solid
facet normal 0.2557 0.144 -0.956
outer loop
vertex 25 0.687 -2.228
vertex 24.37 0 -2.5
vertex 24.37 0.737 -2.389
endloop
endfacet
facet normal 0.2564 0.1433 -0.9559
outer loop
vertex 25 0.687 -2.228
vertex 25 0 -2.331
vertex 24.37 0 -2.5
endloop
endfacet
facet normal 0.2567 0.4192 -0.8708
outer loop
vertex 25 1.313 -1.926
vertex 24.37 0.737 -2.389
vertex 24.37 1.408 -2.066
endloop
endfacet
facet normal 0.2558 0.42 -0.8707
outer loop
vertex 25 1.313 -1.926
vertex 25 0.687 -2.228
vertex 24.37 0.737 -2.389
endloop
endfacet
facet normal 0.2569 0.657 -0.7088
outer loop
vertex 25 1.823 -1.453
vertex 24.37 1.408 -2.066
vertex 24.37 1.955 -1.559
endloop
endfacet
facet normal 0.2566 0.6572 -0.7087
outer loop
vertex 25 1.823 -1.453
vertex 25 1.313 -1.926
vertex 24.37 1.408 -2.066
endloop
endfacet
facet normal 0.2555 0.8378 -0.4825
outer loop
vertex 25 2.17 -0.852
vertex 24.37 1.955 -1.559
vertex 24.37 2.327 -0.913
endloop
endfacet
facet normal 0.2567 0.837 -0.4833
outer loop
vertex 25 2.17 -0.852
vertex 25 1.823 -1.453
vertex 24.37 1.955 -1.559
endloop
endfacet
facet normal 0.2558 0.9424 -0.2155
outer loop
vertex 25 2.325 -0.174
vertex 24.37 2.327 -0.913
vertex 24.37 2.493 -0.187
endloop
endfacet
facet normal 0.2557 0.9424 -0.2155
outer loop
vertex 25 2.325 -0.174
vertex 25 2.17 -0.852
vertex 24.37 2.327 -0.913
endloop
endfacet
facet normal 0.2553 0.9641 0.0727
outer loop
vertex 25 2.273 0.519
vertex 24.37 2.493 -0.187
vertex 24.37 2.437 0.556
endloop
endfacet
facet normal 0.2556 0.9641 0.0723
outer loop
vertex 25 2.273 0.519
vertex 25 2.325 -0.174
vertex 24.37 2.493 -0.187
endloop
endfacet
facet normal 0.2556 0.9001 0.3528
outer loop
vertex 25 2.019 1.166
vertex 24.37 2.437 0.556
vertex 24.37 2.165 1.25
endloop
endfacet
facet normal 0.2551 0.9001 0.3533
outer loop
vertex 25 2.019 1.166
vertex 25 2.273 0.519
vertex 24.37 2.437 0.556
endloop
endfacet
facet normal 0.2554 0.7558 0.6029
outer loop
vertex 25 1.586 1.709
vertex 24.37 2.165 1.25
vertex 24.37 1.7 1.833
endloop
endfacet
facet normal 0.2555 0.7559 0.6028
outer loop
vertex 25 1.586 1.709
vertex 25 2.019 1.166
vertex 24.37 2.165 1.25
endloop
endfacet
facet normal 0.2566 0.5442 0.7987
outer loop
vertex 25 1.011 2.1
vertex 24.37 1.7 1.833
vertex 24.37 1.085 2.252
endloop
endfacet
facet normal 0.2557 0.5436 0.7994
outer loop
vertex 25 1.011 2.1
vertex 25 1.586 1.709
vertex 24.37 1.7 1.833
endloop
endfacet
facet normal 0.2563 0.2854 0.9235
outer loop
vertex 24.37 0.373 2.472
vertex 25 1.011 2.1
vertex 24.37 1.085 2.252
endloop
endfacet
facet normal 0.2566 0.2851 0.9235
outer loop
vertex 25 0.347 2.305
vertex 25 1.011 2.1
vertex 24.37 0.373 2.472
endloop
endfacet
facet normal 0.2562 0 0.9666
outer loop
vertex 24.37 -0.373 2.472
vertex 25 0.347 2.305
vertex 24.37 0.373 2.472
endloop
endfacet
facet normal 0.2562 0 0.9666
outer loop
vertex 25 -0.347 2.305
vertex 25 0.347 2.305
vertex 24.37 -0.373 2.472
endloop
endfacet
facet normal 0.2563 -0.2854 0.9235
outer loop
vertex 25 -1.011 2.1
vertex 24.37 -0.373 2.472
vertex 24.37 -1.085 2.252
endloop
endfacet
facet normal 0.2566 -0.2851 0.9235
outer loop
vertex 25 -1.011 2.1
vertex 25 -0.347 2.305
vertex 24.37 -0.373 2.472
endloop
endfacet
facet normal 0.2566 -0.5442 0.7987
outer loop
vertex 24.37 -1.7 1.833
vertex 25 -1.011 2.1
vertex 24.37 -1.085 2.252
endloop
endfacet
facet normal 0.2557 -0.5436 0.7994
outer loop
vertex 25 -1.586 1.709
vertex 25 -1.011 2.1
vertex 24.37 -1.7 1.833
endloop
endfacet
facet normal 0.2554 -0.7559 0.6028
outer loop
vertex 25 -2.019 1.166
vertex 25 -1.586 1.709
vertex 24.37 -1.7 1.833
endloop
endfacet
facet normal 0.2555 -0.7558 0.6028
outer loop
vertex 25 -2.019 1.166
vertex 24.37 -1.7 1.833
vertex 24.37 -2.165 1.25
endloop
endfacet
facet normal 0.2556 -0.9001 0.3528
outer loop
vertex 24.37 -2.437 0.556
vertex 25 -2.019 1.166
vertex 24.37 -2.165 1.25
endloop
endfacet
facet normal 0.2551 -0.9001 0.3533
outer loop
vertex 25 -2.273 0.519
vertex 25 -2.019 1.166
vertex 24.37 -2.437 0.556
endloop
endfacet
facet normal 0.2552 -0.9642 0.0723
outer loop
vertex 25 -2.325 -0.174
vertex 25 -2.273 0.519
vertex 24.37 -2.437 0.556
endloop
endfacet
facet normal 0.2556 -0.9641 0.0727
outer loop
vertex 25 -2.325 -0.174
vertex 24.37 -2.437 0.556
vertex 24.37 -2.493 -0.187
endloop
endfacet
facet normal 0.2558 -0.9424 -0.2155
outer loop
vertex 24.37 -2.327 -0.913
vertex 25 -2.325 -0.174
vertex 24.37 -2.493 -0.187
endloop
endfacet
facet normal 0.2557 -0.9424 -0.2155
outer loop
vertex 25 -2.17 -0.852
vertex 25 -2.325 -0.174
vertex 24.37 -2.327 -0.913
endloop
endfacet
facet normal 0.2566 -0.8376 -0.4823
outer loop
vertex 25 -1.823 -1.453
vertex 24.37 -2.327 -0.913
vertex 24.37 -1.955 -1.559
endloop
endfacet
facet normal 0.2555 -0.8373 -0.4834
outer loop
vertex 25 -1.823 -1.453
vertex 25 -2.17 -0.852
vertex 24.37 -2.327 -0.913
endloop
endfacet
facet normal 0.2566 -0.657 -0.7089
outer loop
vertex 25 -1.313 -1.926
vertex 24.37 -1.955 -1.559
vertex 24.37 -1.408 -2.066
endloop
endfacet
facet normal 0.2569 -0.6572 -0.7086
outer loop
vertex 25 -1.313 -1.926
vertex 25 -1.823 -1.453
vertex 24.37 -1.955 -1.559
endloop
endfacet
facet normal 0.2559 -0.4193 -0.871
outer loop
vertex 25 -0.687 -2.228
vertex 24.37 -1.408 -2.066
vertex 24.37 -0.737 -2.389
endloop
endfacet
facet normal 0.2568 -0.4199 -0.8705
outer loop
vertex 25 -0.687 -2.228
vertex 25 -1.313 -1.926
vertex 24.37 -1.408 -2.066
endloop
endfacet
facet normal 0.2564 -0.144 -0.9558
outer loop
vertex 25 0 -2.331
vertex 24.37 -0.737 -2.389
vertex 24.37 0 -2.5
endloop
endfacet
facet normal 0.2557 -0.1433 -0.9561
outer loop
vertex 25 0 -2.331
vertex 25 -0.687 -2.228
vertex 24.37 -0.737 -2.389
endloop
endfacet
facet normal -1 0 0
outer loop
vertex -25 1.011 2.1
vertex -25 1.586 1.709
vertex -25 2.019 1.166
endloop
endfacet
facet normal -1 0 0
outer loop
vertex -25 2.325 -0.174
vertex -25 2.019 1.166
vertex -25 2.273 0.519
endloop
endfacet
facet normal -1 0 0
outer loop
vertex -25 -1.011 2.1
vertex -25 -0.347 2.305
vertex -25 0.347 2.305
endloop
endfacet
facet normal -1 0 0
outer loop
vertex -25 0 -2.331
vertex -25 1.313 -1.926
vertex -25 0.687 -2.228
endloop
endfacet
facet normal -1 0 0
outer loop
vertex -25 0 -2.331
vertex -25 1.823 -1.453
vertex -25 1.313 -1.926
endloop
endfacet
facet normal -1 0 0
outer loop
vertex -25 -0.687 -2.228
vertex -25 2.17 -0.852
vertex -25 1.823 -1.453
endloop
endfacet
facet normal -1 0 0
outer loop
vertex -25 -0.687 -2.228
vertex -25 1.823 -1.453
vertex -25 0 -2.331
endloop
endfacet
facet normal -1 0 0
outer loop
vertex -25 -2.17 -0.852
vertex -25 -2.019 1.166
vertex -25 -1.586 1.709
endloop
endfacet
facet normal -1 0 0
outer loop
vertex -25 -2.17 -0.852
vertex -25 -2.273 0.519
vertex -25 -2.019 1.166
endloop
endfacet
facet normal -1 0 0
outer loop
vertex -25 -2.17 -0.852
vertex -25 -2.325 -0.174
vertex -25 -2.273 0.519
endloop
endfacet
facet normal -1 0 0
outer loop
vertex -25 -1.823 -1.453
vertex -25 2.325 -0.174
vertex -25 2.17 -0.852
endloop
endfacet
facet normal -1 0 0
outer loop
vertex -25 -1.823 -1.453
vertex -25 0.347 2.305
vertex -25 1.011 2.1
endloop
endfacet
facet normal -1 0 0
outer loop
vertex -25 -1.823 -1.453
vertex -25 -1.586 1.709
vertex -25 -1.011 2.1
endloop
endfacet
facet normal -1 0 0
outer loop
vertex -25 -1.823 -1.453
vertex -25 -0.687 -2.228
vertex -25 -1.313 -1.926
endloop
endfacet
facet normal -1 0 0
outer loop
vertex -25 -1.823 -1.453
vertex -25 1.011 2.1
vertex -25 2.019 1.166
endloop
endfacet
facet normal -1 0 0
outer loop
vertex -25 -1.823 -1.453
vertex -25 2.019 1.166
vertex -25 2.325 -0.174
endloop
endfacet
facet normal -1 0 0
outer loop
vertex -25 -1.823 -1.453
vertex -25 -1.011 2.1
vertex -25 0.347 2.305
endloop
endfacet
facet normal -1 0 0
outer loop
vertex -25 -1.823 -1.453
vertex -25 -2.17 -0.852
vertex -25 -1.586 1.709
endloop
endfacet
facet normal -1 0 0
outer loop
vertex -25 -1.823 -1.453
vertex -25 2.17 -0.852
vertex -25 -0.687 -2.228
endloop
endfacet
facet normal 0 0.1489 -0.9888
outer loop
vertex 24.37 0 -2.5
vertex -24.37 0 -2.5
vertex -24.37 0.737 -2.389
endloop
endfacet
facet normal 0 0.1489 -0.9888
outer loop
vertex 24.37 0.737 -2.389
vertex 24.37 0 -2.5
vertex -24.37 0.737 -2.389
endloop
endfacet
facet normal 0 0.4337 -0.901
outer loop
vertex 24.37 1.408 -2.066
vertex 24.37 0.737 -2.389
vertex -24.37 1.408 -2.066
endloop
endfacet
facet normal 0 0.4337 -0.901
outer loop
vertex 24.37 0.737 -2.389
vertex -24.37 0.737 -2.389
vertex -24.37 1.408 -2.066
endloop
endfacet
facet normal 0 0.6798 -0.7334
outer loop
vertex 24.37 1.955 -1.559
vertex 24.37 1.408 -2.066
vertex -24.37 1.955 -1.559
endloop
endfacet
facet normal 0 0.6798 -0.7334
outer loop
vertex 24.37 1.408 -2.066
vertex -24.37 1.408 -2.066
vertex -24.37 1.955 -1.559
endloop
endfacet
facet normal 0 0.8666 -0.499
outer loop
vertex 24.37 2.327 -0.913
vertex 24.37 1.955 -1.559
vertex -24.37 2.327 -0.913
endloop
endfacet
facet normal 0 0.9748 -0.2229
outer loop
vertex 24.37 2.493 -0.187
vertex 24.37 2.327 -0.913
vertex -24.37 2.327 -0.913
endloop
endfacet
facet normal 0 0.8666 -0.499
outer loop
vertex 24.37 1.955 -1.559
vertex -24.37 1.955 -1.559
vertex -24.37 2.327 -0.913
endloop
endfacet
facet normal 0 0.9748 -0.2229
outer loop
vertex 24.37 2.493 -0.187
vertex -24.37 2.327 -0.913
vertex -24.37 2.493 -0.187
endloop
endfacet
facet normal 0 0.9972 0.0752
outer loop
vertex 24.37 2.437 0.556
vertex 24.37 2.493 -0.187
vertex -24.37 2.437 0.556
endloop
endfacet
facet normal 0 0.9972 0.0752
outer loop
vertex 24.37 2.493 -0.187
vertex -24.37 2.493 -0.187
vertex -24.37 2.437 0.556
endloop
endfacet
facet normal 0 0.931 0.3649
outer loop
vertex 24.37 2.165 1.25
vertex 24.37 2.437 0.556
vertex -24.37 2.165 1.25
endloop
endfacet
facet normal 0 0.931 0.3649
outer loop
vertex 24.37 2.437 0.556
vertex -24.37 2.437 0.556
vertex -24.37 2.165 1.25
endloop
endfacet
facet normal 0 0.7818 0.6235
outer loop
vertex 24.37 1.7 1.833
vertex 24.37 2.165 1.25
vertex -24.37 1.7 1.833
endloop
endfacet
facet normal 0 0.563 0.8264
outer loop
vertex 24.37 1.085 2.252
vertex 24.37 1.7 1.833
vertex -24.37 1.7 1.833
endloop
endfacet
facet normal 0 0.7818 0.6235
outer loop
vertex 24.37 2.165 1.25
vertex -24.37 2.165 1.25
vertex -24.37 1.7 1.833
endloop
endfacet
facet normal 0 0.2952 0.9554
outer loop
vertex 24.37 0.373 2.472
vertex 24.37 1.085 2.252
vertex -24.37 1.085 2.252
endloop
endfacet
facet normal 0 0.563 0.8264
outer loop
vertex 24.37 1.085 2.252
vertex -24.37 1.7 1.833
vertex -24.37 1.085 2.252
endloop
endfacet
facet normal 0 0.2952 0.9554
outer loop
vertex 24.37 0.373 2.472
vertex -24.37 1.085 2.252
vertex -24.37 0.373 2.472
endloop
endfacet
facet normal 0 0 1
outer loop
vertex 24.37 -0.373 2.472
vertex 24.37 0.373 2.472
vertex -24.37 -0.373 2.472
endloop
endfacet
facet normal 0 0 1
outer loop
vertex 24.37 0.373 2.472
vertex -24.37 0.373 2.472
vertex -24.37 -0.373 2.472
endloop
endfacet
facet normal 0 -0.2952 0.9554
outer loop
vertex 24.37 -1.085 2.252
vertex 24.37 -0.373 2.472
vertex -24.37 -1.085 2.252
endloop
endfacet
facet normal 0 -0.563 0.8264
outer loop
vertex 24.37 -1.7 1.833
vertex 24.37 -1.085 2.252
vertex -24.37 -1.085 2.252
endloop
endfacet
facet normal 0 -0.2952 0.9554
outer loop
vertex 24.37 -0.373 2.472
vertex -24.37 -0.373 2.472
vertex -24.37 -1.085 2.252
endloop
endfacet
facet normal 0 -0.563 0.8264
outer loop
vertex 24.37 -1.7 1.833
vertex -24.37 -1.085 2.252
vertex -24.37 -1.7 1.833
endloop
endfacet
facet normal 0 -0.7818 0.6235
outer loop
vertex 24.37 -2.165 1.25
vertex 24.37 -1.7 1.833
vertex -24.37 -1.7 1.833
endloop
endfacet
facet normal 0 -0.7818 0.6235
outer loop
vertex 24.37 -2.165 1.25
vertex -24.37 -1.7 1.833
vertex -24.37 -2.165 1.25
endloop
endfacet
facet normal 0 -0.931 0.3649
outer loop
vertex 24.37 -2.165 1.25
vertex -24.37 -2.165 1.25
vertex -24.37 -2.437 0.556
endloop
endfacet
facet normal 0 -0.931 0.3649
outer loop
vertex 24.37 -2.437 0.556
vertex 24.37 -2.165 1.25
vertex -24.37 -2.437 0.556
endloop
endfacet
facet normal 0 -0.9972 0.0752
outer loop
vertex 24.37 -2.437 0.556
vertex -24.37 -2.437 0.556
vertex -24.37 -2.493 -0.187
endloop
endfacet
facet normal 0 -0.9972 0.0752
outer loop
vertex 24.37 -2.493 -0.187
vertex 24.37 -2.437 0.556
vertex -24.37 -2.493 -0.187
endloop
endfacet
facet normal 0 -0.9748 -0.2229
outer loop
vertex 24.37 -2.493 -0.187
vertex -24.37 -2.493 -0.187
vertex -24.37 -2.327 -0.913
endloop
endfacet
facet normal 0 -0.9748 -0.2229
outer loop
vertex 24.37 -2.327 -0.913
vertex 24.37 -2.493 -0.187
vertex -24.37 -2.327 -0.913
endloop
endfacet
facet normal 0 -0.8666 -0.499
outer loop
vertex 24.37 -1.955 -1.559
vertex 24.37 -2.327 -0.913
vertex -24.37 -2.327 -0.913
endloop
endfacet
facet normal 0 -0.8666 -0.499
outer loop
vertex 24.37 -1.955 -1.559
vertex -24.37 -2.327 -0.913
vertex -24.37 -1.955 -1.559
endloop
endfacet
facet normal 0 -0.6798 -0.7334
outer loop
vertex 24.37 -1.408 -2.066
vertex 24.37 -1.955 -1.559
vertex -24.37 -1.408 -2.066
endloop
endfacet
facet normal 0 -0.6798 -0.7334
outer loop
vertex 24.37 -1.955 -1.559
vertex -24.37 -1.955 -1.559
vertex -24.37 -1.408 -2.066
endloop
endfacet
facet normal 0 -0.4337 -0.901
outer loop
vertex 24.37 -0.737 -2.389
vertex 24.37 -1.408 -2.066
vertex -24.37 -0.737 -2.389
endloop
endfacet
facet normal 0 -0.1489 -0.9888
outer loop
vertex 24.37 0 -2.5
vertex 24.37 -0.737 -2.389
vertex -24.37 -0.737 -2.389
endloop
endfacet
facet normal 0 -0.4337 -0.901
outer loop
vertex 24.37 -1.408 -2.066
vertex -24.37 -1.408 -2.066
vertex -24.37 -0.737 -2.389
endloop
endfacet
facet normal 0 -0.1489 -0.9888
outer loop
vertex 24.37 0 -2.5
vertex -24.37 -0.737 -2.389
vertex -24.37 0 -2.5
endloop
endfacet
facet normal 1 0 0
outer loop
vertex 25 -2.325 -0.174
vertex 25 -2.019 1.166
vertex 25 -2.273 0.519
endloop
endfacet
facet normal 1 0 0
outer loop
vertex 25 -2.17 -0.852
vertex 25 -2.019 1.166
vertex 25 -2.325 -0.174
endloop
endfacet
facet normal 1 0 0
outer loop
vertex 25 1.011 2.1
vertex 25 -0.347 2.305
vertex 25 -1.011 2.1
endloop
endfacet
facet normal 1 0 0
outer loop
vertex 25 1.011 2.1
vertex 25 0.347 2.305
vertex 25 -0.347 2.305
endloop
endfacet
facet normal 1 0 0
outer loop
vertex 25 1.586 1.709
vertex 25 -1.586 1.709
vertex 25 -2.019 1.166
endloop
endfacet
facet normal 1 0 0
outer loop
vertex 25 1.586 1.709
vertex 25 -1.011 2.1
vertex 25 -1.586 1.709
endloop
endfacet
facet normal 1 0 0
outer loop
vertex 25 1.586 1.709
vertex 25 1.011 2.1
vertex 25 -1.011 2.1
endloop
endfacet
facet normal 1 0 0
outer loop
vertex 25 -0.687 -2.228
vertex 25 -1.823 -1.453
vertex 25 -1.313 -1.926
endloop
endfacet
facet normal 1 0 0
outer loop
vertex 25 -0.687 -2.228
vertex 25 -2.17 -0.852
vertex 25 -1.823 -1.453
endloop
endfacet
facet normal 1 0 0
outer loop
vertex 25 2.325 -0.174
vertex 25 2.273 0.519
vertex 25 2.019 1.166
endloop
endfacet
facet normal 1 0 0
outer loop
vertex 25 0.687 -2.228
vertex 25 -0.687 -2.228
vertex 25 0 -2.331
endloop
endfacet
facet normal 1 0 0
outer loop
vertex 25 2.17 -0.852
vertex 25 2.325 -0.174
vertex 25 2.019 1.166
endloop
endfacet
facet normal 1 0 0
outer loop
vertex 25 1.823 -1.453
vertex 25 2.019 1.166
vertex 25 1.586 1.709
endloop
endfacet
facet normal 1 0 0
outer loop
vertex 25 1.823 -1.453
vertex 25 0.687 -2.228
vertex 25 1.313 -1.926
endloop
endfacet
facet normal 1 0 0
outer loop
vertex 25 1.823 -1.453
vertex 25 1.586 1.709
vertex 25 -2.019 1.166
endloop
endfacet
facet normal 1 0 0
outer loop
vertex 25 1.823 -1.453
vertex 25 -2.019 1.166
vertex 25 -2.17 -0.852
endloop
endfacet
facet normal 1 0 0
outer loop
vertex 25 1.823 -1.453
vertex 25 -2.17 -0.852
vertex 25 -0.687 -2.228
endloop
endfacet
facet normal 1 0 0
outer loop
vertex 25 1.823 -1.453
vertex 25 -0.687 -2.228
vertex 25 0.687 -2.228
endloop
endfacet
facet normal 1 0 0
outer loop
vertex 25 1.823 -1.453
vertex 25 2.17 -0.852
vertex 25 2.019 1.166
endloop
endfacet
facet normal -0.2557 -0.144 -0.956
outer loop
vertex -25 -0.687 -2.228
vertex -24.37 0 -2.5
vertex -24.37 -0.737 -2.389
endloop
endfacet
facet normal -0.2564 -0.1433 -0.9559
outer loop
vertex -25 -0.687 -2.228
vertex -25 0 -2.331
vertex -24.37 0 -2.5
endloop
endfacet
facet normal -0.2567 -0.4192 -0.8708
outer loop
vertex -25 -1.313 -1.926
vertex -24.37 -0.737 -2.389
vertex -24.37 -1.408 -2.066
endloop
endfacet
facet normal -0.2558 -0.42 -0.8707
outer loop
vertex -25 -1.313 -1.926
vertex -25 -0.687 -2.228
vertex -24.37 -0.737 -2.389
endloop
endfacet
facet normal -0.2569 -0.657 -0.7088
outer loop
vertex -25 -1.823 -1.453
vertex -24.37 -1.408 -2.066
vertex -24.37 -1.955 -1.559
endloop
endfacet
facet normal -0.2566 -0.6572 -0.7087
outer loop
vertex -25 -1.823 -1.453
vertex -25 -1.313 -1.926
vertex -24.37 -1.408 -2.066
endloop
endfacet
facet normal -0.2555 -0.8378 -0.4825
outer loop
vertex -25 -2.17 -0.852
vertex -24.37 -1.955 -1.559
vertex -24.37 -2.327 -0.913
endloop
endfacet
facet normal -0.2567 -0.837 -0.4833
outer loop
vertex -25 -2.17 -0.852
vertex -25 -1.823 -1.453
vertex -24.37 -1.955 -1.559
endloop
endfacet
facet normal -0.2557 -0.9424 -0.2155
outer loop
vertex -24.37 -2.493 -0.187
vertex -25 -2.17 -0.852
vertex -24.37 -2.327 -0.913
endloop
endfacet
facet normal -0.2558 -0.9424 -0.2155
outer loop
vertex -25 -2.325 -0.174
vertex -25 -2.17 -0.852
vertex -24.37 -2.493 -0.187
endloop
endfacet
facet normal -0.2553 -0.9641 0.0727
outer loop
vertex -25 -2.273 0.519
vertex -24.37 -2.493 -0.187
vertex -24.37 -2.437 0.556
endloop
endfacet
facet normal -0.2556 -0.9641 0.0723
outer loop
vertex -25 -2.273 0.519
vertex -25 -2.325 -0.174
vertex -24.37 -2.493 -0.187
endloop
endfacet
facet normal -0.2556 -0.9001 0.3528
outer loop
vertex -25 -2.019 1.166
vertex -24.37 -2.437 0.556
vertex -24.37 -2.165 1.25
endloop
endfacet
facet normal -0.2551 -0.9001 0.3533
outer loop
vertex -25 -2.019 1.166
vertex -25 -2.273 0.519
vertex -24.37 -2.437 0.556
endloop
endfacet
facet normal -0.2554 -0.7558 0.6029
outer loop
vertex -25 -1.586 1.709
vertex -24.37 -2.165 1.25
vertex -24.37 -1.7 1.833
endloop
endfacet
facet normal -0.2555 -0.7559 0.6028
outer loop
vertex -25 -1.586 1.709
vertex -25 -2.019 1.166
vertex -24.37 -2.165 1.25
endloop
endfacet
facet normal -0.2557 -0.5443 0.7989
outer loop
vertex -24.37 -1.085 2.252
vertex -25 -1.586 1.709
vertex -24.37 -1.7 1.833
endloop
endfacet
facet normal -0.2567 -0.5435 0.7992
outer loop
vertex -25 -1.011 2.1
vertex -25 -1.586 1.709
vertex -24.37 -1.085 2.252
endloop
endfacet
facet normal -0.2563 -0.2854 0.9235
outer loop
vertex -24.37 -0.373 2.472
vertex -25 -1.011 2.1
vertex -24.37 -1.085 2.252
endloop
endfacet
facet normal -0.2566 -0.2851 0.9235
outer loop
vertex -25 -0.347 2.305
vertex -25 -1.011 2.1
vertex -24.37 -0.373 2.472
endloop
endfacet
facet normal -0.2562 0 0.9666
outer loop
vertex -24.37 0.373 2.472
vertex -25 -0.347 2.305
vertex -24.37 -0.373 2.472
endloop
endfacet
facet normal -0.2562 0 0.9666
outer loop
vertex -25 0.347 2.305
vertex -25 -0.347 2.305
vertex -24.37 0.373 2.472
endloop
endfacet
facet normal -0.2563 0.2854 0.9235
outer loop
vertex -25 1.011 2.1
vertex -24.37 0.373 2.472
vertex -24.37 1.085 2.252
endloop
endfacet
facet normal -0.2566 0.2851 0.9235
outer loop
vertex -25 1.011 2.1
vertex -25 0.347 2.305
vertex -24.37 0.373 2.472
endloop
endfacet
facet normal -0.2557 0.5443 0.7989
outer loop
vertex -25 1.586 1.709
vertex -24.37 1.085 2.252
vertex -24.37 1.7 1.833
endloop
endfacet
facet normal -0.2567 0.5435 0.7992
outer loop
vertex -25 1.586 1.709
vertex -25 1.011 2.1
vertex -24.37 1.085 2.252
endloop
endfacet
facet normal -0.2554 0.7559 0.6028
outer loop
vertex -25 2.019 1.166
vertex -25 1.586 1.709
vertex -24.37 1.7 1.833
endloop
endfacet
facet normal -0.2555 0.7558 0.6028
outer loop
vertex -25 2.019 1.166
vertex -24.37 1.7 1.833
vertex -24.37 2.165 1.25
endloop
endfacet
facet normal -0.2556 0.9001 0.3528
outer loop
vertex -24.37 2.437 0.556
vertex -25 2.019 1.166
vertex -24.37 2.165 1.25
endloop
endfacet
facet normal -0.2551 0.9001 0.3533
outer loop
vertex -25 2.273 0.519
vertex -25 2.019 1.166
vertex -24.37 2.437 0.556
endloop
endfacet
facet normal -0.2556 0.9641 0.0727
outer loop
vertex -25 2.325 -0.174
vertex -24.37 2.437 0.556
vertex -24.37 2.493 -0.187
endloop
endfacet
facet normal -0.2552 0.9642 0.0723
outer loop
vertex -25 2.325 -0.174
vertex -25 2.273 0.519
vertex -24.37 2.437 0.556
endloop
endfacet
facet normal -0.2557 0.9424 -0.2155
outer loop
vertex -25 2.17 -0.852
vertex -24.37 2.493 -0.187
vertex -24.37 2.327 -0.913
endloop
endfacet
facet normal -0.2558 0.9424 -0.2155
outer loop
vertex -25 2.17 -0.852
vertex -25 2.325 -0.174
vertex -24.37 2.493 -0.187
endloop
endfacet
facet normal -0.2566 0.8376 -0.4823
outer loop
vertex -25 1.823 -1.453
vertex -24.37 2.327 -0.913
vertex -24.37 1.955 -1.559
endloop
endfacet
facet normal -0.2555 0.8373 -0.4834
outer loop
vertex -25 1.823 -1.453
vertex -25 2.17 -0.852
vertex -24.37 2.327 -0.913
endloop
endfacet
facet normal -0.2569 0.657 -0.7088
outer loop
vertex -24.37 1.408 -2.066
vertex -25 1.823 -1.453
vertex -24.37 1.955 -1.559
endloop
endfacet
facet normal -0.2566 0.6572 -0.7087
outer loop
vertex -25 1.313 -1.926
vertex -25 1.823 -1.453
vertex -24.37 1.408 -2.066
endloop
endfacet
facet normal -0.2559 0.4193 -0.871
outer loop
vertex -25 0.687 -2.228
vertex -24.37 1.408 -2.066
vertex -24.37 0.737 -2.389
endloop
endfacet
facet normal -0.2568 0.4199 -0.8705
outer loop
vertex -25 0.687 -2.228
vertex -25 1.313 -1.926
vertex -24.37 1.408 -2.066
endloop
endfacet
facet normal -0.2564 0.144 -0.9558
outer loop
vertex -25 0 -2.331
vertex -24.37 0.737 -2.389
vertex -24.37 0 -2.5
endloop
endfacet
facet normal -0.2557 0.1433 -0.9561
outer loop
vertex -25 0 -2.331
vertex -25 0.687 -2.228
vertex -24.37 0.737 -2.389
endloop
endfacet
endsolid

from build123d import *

# Parameters (mm, degrees)
EXTRUDE1_DEPTH      = 24.37
EXTRUDE1_DEPTH_BACK = 24.37
SKETCH2_R           = 2.5
SKETCH3_R           = 2.5
EXTRUDE2_DEPTH      = 0.63
EXTRUDE2_TAPER      = 15
SKETCH4_R           = 2.5
EXTRUDE3_DEPTH      = 0.63
EXTRUDE3_TAPER      = 15


with BuildPart() as part:
    # Sketch2 → Extrude1 (new, two sides: drawn at the far end of the back side and taken through both)
    with BuildSketch(Plane(origin=(0, 0, 0), x_dir=(0, 0, -1), z_dir=(1, 0, 0)).offset(-EXTRUDE1_DEPTH_BACK)):
        Circle(SKETCH2_R)
    extrude(amount=EXTRUDE1_DEPTH + EXTRUDE1_DEPTH_BACK)

    # Sketch3 → Extrude2 (add)
    with BuildSketch(Plane(origin=(24.37, 0, 0), x_dir=(0, 0, -1), z_dir=(1, 0, 0))):
        Circle(SKETCH3_R)
    extrude(amount=EXTRUDE2_DEPTH, taper=EXTRUDE2_TAPER)

    # Sketch4 → Extrude3 (add)
    with BuildSketch(Plane.ZY.offset(24.37)):
        with Locations(Location((0, 0, 0), (0, 0, 180))):
            Circle(SKETCH4_R)
    extrude(amount=EXTRUDE3_DEPTH, taper=EXTRUDE3_TAPER)


solid = part.part
